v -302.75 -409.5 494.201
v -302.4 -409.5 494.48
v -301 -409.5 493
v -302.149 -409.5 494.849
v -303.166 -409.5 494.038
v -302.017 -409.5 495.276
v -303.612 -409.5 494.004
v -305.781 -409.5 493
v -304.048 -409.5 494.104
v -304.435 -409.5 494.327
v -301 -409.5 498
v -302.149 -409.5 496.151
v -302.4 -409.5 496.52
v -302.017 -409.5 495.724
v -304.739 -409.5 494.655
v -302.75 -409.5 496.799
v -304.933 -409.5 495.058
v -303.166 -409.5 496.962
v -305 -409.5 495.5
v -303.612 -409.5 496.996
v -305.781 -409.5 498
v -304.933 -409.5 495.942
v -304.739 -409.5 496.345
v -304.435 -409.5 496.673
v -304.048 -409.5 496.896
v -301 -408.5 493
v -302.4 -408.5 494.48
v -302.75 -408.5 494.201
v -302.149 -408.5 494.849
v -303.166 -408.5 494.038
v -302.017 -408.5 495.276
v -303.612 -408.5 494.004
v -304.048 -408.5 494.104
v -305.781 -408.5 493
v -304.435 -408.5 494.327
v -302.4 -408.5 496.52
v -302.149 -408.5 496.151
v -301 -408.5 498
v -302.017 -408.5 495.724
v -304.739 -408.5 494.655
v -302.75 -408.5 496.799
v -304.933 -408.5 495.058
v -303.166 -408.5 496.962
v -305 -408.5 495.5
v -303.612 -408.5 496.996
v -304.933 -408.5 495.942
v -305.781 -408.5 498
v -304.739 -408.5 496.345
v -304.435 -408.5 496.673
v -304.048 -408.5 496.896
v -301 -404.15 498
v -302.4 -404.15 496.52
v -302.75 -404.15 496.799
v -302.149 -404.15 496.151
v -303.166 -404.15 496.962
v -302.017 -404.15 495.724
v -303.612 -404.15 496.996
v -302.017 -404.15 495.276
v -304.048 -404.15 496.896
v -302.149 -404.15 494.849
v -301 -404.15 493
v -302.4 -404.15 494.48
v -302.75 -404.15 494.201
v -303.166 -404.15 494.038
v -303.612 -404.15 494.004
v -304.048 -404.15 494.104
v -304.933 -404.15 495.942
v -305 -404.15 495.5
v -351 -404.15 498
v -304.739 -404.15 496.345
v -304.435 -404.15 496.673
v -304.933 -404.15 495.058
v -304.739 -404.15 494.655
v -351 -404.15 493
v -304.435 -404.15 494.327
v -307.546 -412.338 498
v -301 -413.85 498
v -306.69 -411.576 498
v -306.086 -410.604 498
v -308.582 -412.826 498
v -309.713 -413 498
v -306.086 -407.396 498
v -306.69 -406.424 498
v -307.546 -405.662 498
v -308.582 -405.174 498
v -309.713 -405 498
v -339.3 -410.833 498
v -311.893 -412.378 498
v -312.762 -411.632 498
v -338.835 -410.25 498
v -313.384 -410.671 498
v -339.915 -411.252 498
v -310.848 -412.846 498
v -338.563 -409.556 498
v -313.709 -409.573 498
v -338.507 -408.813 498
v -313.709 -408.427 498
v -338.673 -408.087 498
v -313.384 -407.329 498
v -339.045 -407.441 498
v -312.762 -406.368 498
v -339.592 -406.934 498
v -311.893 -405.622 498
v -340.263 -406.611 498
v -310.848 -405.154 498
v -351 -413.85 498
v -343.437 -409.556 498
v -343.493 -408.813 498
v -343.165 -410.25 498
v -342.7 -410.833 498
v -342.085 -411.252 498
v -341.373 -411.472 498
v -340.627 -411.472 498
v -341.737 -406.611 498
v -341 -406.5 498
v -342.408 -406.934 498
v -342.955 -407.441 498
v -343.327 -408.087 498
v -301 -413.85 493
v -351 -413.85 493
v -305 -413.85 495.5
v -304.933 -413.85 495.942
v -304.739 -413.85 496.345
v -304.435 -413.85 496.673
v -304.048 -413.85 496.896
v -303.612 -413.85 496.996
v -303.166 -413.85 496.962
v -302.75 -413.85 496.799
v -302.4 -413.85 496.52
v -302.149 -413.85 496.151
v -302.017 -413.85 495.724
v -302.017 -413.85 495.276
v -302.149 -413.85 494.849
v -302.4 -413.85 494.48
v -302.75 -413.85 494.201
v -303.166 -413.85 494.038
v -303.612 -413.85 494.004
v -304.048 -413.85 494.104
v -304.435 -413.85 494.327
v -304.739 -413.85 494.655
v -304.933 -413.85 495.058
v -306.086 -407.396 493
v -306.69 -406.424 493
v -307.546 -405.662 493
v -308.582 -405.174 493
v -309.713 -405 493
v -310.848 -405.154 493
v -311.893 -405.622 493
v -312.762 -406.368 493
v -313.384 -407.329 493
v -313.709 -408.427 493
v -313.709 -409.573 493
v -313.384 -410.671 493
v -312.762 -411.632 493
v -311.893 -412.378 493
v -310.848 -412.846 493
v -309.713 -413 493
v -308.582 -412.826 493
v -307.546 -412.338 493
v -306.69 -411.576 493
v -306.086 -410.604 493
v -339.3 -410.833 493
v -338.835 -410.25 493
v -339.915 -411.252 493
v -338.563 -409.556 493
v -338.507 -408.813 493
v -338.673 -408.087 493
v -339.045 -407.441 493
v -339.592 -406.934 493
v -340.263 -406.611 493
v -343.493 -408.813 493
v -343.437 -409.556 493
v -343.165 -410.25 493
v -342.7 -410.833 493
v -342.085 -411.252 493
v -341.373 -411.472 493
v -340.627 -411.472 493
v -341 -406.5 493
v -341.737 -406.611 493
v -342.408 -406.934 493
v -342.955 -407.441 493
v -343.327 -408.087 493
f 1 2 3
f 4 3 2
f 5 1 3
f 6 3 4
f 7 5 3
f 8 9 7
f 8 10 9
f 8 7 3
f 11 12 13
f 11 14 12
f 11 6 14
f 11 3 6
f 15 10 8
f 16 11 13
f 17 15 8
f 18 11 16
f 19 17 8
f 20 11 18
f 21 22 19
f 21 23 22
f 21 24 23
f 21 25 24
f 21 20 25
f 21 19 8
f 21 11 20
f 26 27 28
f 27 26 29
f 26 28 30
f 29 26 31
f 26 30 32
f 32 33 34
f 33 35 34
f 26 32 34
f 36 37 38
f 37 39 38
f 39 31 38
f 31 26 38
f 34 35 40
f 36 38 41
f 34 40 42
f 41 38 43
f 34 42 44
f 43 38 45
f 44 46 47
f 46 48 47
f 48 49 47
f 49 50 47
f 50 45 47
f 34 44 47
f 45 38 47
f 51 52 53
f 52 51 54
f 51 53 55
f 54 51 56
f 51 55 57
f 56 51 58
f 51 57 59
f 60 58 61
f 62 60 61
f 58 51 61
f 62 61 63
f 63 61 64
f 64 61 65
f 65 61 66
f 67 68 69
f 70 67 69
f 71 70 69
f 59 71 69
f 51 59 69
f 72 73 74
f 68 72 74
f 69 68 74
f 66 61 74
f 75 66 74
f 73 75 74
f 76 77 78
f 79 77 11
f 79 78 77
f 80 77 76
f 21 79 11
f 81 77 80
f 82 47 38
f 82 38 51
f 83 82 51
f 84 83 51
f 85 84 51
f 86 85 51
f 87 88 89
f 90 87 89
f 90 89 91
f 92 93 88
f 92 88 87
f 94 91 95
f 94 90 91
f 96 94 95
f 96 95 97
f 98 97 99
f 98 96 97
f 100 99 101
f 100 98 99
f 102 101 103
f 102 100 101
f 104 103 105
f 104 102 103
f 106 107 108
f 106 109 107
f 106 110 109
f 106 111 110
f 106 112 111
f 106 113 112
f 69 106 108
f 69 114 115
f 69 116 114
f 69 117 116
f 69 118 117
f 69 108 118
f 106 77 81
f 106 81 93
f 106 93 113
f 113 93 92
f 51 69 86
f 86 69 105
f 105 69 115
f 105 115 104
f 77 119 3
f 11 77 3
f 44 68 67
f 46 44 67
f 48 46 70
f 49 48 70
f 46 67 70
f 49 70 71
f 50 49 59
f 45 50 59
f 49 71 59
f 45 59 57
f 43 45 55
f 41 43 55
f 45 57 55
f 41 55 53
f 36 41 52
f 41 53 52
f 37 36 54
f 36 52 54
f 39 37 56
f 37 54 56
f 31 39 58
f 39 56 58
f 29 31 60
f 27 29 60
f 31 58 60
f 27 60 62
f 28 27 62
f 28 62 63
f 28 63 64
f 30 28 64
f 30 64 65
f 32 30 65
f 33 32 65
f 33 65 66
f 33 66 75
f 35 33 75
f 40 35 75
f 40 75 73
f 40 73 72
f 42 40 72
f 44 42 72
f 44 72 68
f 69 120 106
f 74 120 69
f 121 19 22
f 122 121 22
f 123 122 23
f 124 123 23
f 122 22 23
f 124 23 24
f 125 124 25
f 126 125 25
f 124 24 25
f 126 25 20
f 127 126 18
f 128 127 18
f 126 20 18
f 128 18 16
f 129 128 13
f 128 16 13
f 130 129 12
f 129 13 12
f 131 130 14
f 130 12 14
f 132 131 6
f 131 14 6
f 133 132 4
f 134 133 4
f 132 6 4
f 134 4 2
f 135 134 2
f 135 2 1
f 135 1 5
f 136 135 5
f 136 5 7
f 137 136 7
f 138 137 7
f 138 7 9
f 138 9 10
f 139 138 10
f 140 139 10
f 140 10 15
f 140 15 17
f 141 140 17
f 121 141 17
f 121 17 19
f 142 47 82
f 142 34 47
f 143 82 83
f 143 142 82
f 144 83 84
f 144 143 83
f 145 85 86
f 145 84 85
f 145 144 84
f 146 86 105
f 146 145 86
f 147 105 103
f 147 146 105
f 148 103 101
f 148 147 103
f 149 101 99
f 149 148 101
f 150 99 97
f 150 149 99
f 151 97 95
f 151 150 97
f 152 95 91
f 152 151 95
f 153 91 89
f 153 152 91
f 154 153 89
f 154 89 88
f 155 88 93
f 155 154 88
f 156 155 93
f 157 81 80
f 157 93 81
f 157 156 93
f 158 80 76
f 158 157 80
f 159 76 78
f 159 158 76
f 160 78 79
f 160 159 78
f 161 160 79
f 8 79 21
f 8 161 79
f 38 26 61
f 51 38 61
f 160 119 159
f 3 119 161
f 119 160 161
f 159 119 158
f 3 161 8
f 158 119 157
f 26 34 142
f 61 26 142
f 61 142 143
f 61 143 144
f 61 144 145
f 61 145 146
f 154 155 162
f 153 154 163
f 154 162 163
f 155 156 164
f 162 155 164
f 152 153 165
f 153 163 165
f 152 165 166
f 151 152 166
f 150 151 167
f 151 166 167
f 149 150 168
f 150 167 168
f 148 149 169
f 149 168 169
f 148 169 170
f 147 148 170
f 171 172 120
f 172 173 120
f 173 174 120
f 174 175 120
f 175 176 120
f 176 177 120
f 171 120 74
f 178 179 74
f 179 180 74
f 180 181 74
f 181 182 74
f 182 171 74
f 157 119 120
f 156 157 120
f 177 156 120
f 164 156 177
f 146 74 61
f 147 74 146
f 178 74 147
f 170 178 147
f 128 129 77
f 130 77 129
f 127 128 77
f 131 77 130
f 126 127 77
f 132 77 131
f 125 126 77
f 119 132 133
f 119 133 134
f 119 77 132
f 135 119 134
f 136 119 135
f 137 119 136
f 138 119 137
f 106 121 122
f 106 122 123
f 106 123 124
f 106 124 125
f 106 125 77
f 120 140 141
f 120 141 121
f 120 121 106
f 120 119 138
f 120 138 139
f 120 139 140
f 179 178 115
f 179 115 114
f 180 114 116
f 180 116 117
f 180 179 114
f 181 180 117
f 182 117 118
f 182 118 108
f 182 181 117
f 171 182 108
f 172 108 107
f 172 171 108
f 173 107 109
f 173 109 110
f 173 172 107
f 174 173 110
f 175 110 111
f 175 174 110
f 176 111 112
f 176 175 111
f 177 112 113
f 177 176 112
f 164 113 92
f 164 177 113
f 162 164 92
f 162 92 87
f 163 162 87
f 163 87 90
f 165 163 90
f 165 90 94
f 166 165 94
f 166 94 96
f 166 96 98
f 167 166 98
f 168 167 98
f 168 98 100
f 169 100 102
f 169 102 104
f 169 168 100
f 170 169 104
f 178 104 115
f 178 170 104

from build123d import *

# Parameters (mm, degrees)
SKETCH048_W           = 9.7
SKETCH048_H           = 50
SKETCH048_R           = 4
SKETCH048_R_2         = 2.5
PAD028_DEPTH          = 5
SKETCH049_W           = 1
SKETCH049_H           = 5.04
POCKET023_DEPTH       = 5.001
SKETCH050_R           = 1.5
POCKET024_DEPTH       = 9.701
CLONE_PLACEMENT_ANGLE = 90


with BuildPart() as part:
    # Sketch048 → Pad028 (new body)
    with BuildSketch(Plane.XY):
        Rectangle(SKETCH048_W, SKETCH048_H)
        with Locations((0, -16.25)):
            Circle(SKETCH048_R, mode=Mode.SUBTRACT)
        with Locations((0, 15)):
            Circle(SKETCH048_R_2, mode=Mode.SUBTRACT)
    extrude(amount=PAD028_DEPTH)

    # Sketch049 (on Face8 of Pad028) → Pocket023 (cut, through all)
    with BuildSketch(Plane.XY.offset(5)):
        with Locations((0, -22.48)):
            Rectangle(SKETCH049_W, SKETCH049_H)
    extrude(amount=-POCKET023_DEPTH, mode=Mode.SUBTRACT)

    # Sketch050 (on Face3 of Pocket023) → Pocket024 (cut, through all)
    with BuildSketch(Plane.YZ.offset(4.85)):
        with Locations((-22.5, 2.5)):
            Circle(SKETCH050_R)
    extrude(amount=-POCKET024_DEPTH, mode=Mode.SUBTRACT)


with BuildPart() as part_1:
    # Clone placement: moved
    add(part.part.moved(Location((-326, 1, 493))).rotate(Axis((-326, 1, 493), (0, 0, 1)), CLONE_PLACEMENT_ANGLE))


with BuildPart() as part_2:
    # Clone044 placement: moved
    add(part_1.part.moved(Location((0, -410, 0))))


solid = part_2.part
